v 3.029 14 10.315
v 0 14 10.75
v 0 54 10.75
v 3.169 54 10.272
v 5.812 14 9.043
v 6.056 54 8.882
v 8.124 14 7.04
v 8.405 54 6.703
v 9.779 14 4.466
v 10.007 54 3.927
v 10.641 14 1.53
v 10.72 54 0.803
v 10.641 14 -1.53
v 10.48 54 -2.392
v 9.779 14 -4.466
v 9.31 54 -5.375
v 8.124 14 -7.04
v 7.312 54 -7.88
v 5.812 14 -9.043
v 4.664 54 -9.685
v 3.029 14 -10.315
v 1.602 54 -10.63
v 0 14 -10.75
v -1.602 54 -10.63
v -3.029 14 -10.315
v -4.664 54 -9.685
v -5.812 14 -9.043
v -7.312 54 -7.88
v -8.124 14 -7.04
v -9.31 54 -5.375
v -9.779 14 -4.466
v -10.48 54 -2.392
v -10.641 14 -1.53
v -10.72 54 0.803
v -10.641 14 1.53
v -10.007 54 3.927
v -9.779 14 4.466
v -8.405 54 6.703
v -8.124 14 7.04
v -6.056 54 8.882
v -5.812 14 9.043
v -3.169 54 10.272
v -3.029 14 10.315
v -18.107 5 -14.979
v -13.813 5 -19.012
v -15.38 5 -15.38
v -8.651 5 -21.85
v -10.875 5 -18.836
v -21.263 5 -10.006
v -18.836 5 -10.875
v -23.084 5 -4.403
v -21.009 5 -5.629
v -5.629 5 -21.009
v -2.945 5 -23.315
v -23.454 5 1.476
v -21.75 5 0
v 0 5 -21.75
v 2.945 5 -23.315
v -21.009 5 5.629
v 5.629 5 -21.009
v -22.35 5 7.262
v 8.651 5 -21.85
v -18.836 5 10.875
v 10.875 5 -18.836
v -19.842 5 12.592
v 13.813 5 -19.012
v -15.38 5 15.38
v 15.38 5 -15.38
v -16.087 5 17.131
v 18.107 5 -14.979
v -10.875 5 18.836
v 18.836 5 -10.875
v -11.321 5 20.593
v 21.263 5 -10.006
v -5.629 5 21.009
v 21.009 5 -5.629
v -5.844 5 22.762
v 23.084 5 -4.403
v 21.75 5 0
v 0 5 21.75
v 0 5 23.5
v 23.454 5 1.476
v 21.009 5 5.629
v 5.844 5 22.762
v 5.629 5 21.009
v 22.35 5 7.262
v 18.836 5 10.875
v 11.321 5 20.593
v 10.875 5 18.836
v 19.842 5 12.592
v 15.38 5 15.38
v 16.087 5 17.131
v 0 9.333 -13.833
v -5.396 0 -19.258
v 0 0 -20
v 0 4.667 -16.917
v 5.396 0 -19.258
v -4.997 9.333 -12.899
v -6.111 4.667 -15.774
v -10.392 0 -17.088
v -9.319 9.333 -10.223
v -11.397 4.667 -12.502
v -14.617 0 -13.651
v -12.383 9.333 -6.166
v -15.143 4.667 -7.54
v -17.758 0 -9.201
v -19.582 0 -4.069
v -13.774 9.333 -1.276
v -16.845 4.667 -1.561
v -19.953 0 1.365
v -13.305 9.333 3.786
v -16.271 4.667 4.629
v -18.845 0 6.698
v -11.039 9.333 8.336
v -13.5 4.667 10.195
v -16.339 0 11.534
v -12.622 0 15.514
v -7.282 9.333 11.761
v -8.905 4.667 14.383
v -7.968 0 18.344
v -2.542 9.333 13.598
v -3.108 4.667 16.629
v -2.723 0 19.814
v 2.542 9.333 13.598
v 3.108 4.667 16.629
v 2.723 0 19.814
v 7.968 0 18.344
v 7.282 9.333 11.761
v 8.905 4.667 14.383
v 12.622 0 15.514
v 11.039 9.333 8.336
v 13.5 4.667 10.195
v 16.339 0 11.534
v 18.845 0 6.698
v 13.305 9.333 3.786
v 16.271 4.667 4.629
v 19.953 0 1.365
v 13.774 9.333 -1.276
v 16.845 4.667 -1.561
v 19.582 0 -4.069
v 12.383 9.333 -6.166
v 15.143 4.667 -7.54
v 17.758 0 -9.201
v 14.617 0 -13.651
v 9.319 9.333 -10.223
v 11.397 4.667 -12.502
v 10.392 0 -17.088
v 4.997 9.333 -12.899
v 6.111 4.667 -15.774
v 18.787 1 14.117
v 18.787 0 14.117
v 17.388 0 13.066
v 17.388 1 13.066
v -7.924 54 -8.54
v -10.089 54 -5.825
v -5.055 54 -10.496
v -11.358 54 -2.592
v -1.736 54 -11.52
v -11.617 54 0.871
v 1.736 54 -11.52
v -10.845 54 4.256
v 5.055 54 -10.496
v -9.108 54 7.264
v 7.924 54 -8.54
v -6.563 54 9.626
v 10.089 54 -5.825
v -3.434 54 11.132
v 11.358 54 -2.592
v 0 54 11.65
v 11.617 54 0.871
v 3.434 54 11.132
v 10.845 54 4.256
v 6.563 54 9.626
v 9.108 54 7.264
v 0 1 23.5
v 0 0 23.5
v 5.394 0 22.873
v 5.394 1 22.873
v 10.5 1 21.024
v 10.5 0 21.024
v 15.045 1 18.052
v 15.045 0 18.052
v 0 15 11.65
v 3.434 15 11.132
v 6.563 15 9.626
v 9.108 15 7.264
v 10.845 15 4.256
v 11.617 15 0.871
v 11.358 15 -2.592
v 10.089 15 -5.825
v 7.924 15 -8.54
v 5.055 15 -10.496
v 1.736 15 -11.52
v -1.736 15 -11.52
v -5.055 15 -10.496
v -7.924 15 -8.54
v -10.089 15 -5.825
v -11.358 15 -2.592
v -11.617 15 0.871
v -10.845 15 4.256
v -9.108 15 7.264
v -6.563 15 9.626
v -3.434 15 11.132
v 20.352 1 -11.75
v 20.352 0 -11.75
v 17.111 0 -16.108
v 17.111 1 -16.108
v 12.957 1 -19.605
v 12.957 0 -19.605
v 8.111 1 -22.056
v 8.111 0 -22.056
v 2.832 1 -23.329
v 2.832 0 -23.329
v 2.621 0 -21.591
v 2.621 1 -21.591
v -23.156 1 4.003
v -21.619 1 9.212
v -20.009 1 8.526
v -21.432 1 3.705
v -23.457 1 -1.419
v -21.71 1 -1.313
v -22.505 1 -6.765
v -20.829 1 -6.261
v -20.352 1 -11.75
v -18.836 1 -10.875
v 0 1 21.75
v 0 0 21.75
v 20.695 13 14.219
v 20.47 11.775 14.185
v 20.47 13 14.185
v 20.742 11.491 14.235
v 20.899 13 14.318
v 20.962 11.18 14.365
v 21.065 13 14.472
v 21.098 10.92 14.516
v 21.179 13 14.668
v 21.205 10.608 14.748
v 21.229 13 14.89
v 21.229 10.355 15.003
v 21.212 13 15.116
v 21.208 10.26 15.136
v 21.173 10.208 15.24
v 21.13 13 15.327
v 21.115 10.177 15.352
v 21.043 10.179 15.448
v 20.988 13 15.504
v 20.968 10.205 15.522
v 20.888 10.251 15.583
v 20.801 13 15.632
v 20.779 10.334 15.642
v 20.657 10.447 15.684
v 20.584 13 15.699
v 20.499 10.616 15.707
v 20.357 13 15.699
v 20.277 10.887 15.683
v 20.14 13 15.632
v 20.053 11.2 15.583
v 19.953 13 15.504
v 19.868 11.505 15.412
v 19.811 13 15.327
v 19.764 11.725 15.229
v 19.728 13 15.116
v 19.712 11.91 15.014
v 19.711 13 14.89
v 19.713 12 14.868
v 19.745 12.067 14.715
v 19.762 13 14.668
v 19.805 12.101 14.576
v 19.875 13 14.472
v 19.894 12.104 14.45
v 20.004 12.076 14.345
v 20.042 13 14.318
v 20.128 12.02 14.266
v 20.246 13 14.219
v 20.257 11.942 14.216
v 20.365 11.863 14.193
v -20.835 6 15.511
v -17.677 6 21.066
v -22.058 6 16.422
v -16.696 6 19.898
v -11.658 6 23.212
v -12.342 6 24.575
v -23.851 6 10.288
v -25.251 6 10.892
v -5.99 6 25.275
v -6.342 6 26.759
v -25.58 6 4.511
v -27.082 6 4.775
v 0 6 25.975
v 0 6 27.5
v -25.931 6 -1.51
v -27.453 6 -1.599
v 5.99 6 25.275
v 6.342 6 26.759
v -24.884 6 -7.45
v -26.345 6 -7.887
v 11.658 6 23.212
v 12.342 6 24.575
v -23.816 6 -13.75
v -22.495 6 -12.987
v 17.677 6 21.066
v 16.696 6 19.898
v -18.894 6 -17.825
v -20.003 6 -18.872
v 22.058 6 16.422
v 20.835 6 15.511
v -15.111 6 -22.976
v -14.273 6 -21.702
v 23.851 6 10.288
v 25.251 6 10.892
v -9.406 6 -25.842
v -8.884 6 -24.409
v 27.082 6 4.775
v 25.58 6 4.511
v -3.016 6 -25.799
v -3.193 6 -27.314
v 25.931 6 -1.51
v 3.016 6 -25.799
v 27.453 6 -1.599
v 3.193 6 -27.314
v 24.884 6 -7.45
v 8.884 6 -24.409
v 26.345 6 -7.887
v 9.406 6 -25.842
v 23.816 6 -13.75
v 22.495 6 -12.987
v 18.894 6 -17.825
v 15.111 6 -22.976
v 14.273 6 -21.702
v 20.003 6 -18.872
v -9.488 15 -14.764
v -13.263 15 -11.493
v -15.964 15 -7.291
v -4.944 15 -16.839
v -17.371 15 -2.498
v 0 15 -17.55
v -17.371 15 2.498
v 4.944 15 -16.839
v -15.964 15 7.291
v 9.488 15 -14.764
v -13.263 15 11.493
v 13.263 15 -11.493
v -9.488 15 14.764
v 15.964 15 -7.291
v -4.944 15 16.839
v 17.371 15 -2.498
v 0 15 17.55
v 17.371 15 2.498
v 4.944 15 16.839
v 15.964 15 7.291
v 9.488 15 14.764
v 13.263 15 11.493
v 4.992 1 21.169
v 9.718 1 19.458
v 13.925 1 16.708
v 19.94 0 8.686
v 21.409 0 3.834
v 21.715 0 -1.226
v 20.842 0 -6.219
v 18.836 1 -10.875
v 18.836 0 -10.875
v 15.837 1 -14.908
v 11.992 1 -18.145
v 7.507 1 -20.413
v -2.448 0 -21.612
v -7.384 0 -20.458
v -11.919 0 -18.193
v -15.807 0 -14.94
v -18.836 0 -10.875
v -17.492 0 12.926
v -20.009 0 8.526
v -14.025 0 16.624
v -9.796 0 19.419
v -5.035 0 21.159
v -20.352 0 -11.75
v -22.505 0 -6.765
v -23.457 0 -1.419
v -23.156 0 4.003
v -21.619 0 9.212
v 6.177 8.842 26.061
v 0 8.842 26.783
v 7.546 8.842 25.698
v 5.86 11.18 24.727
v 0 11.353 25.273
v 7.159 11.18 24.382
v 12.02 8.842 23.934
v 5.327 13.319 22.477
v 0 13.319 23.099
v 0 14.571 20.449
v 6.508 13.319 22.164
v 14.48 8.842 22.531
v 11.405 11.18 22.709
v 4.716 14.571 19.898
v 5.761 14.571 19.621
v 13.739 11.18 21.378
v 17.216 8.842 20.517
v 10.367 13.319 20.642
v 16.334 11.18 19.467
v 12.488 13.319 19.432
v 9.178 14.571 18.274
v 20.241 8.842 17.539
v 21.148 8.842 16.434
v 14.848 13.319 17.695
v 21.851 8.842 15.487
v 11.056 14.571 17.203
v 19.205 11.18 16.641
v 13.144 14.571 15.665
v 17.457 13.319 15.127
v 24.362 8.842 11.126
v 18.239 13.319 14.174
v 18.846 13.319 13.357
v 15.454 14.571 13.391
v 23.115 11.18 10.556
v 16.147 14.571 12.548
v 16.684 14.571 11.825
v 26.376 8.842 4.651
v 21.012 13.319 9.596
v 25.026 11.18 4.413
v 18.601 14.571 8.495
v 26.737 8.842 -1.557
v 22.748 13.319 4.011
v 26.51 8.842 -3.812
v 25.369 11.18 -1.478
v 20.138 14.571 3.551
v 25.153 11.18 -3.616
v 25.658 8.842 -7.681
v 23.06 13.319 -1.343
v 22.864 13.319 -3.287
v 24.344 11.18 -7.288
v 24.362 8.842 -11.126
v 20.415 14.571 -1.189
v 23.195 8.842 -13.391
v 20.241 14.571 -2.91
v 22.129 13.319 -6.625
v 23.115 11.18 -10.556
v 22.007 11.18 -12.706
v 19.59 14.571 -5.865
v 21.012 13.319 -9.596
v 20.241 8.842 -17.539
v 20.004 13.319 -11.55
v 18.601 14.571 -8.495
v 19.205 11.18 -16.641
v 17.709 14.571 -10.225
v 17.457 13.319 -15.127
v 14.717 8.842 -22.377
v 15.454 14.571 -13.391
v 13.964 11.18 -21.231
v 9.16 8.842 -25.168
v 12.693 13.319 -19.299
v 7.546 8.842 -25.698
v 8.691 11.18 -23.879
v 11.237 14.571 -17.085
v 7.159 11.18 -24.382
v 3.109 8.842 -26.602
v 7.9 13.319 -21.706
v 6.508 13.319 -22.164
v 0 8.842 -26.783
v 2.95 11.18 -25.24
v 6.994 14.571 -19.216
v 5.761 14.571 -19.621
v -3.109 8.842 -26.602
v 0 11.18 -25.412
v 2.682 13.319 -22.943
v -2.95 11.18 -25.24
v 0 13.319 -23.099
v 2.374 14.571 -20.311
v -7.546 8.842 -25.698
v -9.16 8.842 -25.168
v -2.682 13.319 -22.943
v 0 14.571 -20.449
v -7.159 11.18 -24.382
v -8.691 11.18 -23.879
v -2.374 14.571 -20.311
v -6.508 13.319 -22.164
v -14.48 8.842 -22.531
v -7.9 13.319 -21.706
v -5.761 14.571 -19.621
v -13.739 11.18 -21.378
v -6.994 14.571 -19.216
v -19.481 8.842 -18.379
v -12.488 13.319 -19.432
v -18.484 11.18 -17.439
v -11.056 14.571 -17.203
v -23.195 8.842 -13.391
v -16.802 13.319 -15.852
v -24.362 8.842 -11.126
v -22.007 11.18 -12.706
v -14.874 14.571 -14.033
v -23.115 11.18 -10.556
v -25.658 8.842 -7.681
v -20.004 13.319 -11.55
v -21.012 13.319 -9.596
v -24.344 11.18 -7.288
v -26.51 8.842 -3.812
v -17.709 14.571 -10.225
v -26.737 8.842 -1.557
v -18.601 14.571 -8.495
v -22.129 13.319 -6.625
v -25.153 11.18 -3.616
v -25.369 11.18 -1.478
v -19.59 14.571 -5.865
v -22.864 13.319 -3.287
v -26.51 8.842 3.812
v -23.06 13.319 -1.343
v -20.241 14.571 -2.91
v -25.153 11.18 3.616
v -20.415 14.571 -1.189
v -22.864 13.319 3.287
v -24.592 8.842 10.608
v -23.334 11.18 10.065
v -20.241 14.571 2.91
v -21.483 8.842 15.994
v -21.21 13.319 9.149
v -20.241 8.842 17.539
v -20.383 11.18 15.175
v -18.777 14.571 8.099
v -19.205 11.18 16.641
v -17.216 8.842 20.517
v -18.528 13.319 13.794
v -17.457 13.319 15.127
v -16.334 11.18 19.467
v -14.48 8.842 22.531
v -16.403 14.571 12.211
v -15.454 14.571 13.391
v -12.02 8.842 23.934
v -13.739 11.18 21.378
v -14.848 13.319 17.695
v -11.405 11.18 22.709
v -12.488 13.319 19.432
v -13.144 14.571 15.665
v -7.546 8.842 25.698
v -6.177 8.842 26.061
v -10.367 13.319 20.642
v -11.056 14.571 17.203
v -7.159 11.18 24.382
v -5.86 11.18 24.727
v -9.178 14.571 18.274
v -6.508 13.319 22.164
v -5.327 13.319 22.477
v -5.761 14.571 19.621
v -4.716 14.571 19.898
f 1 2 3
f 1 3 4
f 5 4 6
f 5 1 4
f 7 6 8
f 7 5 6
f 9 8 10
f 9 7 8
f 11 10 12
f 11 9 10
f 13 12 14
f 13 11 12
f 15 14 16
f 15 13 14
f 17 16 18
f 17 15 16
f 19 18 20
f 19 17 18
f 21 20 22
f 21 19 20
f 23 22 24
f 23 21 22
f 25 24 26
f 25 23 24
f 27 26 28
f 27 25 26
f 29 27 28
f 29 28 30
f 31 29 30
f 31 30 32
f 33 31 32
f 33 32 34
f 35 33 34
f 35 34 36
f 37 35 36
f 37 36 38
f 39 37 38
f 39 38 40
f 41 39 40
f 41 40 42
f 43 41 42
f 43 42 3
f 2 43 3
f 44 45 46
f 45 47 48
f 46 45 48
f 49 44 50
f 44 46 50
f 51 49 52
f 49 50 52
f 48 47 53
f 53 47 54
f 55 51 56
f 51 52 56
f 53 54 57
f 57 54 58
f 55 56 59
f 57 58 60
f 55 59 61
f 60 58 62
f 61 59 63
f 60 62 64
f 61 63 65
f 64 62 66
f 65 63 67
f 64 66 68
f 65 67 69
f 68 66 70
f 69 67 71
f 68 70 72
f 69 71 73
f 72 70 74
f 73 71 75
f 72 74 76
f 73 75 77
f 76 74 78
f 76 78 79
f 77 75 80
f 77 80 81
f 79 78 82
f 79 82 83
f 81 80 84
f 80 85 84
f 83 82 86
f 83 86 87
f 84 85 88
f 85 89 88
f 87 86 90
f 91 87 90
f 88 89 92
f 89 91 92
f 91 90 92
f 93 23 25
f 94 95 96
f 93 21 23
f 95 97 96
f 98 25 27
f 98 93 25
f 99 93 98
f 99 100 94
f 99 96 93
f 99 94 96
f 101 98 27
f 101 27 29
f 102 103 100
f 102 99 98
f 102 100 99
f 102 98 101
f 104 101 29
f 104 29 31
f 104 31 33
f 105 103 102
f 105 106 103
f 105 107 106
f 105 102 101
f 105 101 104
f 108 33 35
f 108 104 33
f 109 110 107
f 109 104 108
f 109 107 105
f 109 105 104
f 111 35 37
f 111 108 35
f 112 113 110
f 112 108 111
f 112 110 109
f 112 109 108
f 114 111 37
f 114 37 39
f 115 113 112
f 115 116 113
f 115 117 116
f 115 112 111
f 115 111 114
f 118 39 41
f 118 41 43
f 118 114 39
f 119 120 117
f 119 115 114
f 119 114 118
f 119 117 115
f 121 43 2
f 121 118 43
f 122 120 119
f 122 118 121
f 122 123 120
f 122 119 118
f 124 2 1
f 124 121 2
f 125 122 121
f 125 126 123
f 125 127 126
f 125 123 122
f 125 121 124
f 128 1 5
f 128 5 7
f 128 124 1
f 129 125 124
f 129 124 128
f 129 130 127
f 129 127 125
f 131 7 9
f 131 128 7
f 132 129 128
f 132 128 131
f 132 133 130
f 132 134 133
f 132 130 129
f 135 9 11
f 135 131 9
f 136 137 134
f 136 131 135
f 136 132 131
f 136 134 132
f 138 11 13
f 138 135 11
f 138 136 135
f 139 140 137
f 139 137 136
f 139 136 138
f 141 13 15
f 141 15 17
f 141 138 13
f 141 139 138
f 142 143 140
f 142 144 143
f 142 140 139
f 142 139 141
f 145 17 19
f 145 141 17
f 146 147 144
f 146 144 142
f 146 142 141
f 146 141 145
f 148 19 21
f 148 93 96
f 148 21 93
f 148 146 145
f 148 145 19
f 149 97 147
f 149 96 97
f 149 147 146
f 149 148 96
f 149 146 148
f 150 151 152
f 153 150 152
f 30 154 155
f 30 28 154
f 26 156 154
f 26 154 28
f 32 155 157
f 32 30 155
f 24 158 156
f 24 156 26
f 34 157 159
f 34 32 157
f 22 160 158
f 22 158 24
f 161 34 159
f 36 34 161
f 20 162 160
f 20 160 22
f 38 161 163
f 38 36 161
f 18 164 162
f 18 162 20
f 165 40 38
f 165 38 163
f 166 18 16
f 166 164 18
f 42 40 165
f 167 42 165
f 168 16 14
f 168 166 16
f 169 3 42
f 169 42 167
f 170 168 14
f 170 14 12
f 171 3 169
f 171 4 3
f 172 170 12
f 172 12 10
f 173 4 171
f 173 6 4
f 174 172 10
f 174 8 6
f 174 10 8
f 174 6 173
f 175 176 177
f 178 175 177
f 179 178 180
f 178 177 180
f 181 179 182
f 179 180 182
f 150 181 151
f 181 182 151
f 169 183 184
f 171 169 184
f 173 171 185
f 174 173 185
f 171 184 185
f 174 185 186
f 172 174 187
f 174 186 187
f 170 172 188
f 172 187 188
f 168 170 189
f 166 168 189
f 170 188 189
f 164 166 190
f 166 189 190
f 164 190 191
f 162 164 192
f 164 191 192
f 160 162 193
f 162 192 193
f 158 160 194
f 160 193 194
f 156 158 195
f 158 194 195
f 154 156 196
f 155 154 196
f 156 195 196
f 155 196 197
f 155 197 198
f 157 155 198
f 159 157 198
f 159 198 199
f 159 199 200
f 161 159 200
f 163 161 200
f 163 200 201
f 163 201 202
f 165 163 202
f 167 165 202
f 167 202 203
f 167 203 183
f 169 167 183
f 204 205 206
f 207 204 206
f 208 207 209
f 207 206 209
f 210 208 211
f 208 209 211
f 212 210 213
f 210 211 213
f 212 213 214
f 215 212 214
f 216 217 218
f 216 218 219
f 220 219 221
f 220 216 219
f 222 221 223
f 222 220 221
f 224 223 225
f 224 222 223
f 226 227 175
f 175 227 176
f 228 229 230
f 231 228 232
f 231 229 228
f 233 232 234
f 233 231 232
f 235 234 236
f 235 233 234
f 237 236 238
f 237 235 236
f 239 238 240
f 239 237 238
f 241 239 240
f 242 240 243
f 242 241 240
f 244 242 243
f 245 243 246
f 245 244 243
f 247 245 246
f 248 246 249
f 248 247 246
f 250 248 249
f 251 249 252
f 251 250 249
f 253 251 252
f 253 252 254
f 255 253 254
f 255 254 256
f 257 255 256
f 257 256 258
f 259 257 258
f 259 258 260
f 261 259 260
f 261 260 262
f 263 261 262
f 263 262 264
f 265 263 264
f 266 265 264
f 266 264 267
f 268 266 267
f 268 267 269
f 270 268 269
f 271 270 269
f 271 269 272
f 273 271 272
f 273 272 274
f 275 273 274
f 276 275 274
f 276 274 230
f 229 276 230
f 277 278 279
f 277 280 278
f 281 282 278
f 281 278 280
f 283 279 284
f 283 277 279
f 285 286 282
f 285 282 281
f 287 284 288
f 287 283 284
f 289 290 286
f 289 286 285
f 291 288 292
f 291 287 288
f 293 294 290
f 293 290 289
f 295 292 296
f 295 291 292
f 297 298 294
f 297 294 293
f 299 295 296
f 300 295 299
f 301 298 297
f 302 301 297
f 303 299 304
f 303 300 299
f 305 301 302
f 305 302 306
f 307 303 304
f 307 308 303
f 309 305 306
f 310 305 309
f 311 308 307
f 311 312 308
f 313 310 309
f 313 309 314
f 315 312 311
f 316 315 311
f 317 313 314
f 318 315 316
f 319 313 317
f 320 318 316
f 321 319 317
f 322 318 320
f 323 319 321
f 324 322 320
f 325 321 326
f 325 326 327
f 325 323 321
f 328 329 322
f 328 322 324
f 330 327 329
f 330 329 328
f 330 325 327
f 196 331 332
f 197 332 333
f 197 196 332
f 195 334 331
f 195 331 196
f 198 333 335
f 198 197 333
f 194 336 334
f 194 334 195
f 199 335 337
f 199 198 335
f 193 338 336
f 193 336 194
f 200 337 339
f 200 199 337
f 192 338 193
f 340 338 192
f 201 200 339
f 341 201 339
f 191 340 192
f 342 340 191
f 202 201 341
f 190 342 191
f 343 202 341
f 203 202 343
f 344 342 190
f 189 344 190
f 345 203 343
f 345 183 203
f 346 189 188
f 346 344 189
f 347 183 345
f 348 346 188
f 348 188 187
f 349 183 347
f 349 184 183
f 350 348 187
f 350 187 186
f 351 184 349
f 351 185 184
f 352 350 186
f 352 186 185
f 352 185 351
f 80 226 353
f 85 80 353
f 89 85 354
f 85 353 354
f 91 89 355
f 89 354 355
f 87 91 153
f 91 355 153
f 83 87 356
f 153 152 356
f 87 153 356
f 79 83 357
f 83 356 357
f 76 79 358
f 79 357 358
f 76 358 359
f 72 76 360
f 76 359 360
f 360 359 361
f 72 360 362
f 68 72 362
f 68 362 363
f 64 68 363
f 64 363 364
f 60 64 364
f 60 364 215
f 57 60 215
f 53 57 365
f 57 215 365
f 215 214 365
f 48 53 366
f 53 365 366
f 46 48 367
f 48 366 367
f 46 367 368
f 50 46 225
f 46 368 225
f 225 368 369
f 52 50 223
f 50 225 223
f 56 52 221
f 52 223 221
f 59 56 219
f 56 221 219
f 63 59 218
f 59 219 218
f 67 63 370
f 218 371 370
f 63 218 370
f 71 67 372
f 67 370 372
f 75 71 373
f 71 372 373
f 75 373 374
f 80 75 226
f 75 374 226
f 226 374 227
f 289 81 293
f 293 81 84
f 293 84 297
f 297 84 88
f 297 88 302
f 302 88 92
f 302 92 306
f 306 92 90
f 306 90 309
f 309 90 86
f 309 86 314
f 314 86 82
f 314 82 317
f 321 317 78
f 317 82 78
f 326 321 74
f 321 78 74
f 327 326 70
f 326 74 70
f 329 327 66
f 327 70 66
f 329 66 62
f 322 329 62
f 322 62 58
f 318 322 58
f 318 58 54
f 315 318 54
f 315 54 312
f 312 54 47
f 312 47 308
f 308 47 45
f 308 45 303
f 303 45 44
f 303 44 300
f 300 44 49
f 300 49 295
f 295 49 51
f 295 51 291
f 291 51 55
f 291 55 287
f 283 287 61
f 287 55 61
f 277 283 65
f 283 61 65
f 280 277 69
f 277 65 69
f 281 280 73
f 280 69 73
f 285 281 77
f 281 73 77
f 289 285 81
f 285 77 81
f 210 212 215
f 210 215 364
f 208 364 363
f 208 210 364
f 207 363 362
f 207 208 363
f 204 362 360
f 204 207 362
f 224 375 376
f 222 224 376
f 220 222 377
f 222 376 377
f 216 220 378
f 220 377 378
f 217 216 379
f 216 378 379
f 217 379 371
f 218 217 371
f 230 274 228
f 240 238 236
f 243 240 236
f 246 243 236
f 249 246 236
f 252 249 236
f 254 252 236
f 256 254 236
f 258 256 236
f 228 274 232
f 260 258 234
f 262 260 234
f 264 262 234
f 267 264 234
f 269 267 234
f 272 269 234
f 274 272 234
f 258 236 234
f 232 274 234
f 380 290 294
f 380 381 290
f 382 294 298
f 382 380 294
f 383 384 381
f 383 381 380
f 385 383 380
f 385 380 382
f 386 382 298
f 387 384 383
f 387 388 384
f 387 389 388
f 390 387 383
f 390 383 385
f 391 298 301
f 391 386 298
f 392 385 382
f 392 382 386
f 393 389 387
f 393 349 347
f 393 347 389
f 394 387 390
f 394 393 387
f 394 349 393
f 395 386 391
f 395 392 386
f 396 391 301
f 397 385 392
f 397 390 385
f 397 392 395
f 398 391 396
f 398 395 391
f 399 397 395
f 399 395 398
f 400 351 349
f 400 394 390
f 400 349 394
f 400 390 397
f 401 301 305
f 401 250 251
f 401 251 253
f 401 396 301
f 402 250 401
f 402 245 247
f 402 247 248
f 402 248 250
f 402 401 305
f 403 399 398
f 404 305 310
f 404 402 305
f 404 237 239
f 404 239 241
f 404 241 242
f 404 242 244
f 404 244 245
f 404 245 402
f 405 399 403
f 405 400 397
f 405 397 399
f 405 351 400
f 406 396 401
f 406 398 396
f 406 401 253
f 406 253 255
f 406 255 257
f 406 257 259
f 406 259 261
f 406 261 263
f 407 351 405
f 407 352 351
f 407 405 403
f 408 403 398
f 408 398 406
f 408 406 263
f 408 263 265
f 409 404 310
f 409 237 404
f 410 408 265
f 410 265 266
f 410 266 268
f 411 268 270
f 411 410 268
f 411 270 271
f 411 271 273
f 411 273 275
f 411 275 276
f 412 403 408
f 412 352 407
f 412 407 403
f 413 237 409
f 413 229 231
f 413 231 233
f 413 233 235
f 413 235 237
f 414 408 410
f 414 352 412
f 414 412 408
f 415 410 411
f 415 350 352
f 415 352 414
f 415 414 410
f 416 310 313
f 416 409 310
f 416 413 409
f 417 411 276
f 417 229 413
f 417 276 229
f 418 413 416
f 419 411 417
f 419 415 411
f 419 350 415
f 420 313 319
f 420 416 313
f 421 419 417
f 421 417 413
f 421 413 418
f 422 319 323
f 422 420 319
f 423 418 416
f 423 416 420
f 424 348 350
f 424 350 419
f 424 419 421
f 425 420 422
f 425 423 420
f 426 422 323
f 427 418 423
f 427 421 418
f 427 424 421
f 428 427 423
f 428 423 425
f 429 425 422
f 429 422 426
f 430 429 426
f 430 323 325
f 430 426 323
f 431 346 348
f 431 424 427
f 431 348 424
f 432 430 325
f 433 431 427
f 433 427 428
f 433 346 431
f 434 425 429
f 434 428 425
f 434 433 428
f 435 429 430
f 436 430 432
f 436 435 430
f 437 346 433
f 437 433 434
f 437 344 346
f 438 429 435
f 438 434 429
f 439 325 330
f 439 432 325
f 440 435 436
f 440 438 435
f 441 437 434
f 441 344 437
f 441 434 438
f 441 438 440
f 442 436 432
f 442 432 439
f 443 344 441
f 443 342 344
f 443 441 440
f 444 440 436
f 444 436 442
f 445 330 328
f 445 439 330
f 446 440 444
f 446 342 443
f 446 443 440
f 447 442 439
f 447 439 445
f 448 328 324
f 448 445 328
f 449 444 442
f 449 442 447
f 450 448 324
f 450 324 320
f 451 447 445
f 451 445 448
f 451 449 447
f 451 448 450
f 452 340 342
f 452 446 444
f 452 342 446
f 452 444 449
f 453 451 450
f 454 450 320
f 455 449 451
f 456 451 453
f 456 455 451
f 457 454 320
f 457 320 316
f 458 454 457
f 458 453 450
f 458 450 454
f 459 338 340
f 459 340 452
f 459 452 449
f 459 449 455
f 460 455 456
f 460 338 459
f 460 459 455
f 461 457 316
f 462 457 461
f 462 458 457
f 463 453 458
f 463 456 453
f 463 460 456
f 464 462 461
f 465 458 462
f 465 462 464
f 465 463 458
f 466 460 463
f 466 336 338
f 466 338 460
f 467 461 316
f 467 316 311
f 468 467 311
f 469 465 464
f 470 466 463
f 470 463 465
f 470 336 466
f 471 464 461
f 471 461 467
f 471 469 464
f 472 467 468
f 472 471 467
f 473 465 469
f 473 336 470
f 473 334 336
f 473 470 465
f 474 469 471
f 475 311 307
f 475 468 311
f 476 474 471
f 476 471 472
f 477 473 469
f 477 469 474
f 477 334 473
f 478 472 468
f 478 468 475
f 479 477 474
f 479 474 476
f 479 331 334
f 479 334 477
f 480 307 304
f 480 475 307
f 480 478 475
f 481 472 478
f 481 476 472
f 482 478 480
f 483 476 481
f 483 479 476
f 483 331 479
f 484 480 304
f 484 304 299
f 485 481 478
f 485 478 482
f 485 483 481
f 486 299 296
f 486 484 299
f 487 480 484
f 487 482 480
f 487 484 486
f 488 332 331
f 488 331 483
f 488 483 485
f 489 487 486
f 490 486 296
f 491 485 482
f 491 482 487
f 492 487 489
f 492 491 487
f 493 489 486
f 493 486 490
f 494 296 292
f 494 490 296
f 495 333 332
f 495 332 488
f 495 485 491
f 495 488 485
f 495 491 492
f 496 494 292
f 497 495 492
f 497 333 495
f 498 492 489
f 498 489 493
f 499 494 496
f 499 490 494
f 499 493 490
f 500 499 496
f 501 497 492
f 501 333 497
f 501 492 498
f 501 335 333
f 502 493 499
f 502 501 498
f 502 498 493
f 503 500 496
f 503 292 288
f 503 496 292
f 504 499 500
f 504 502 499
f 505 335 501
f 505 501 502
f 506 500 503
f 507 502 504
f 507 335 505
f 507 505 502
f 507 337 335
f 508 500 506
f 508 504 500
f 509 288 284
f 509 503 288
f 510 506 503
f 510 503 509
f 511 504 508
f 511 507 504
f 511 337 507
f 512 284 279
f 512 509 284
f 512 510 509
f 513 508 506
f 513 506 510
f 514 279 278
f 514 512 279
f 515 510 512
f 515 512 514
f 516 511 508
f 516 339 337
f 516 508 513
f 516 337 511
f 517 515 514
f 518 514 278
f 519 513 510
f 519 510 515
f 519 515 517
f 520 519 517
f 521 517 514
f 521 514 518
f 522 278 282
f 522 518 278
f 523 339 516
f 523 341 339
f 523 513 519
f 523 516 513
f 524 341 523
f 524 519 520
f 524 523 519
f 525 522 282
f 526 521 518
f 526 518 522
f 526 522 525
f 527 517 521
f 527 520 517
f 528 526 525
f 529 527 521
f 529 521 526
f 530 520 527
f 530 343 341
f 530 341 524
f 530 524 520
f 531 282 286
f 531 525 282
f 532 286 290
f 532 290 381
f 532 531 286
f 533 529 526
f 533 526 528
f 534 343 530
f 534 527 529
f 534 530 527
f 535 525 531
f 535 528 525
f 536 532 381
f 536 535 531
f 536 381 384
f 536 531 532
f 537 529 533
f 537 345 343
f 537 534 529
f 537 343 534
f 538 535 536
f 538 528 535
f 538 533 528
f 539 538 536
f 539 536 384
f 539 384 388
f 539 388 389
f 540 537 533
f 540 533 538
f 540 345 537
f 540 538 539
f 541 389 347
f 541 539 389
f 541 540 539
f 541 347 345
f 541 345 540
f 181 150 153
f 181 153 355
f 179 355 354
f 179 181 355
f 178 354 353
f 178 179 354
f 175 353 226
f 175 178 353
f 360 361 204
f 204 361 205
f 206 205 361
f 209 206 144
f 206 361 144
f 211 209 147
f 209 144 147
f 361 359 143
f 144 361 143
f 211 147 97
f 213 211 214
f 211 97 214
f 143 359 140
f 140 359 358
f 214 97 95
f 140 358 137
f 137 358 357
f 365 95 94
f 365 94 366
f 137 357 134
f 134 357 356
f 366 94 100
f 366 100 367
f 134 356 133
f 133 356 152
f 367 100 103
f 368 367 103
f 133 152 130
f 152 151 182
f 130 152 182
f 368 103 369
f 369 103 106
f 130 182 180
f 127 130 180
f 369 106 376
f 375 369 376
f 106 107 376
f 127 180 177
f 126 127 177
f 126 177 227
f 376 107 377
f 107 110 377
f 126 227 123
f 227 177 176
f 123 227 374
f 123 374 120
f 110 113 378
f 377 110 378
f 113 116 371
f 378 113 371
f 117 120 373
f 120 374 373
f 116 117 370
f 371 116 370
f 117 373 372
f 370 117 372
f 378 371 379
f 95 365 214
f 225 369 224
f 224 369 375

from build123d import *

# Parameters (mm, degrees)
SKETCH1_R           = 21.75
SKETCH1_R_2         = 20
BOSS_EXTRUDE1_DEPTH = 5
SKETCH2_R           = 23.5
SKETCH2_R_2         = 20
BOSS_EXTRUDE2_DEPTH = 1
SKETCH3_R           = 27.5
SKETCH3_R_2         = 20
BOSS_EXTRUDE3_DEPTH = 8
SKETCH4_R           = 11.65
SKETCH4_R_2         = 10.75
BOSS_EXTRUDE4_DEPTH = 40
SKETCH5_R           = 27.5
SKETCH5_R_2         = 11.65
BOSS_EXTRUDE5_DEPTH = 1
BOSS_EXTRUDE6_DEPTH = 1
CIRPATTERN1_COUNT   = 3
FILLET1_R           = 10
SKETCH8_R           = 0.761145908
BOSS_EXTRUDE7_DEPTH = 7
CHAMFER2_SIZE2      = 1
CHAMFER2_SIZE       = 2.475086853


# Some blends are built 0.0001 mm under size
with BuildPart() as part:
    # Sketch1 → Boss-Extrude1 (new body)
    with BuildSketch(Plane(origin=(0, 0, 0), x_dir=(1, 0, 0), z_dir=(0, 1, 0))):
        with Locations(Location((0, 0, 0), (0, 0, 270))):
            Circle(SKETCH1_R)
        with Locations(Location((0, 0, 0), (0, 0, 270))):
            Circle(SKETCH1_R_2, mode=Mode.SUBTRACT)
    boss_extrude1 = extrude(amount=BOSS_EXTRUDE1_DEPTH)

    # Sketch2 → Boss-Extrude2 (add)
    with BuildSketch(Plane(origin=(0, 5, 0), x_dir=(1, 0, 0), z_dir=(0, 1, 0))):
        with Locations(Location((0, 0, 0), (0, 0, 270))):
            Circle(SKETCH2_R)
        with Locations(Location((0, 0, 0), (0, 0, 270))):
            Circle(SKETCH2_R_2, mode=Mode.SUBTRACT)
    extrude(amount=BOSS_EXTRUDE2_DEPTH)

    # Sketch3 → Boss-Extrude3 (add)
    with BuildSketch(Plane(origin=(0, 6, 0), x_dir=(1, 0, 0), z_dir=(0, 1, 0))):
        with Locations(Location((0, 0, 0), (0, 0, 270))):
            Circle(SKETCH3_R)
        with Locations(Location((0, 0, 0), (0, 0, 270))):
            Circle(SKETCH3_R_2, mode=Mode.SUBTRACT)
    extrude(amount=BOSS_EXTRUDE3_DEPTH)



with BuildPart() as body_2:
    # Sketch4 → Boss-Extrude4 (new body)
    with BuildSketch(Plane(origin=(0, 14, 0), x_dir=(1, 0, 0), z_dir=(0, 1, 0))):
        with Locations(Location((0, 0, 0), (0, 0, 270))):
            Circle(SKETCH4_R)
        with Locations(Location((0, 0, 0), (0, 0, 270))):
            Circle(SKETCH4_R_2, mode=Mode.SUBTRACT)
    extrude(amount=BOSS_EXTRUDE4_DEPTH)


with BuildPart() as part_1:
    add(part.part)

    add(body_2.part)  # Boss-Extrude5 merges body 2
    # Sketch5 → Boss-Extrude5 (add)
    with BuildSketch(Plane(origin=(0, 14, 0), x_dir=(1, 0, 0), z_dir=(0, 1, 0))):
        with Locations(Location((0, 0, 0), (0, 0, 270))):
            Circle(SKETCH5_R)
        with Locations(Location((0, 0, 0), (0, 0, 270))):
            Circle(SKETCH5_R_2, mode=Mode.SUBTRACT)
    extrude(amount=BOSS_EXTRUDE5_DEPTH)

    # Sketch6 → Revolve1 (revolve)
    with BuildSketch(Plane.XY, mode=Mode.PRIVATE) as revolve1_sk:
        Polygon((10.75, 14), (20, 0), (20, 14), align=None)
    revolve(revolve1_sk.sketch.rotate(Axis((0, 0, 0), (0, 1, 0)), 90), axis=Axis((0, 0, 0), (0, 1, 0)))

    # Sketch7 → Boss-Extrude6 (add)
    with BuildSketch(Plane.XZ):
        with BuildLine():
            Line((0, 21.75), (0, 23.5))
            ThreePointArc((0, 23.5), (10.5, 21.023796042), (18.787221995, 14.117021277))
            Line((18.787221995, 14.117021277), (17.388173548, 13.065753735))
            ThreePointArc((17.388173548, 13.065753735), (9.718085106, 19.458194209), (0, 21.75))
        make_face()
    boss_extrude6 = extrude(amount=-BOSS_EXTRUDE6_DEPTH)

    # CirPattern1: Boss-Extrude1, Boss-Extrude6 ×3 about axis
    cirpattern1_axis = Axis((0, 0, 0), (0, 1, 0))
    add([boss_extrude1.rotate(cirpattern1_axis, i * 360 / CIRPATTERN1_COUNT) for i in range(1, CIRPATTERN1_COUNT)])
    add([boss_extrude6.rotate(cirpattern1_axis, i * 360 / CIRPATTERN1_COUNT) for i in range(1, CIRPATTERN1_COUNT)])

    # Fillet1
    # the kernel refuses this fillet: 10 mm, written as the material it takes off along each edge
    with BuildSketch(Plane(origin=(0, 15, 0), x_dir=(0, 0, 1), z_dir=(-1, 0, 0))) as fillet1_piece_1:
        with BuildLine():
            CenterArc((17.550125629, -10), FILLET1_R, 5.739170477, 84.260829523)
            Line((17.550125629, 0), (17.550125629, 0.2))
            Line((17.550125629, 0.2), (27.5, 0.2))
            Line((27.5, 0.2), (27.7, 0))
            ThreePointArc((27.7, 0), (27.7, -4.5), (27.698997487, -8.98))
            Line((27.698997487, -8.98), (27.5, -9))
        make_face()
    revolve(axis=Axis((0, 15, 0), (0, 1, 0)), mode=Mode.SUBTRACT)

    # Sketch8 → Boss-Extrude7 (add)
    with BuildSketch(Plane.XZ.offset(-6)):
        with Locations(Location((20.470368468, 14.946483104, 0), (0, 0, 270))):
            Circle(SKETCH8_R)
    extrude(amount=-BOSS_EXTRUDE7_DEPTH)

    # Chamfer2
    chamfer2_edges = [part_1.edges().sort_by_distance(p)[0] for p in [
        (0, 6, -23.5),
    ]]
    chamfer2_side = [part_1.faces().sort_by_distance(p)[0] for p in [
        (0, 6, -23.52),
    ]]
    chamfer(chamfer2_edges, length=CHAMFER2_SIZE - 0.0001, length2=CHAMFER2_SIZE2 - 0.0001, reference=chamfer2_side[0])  # a hair under: the kernel refuses the full size


solid = part_1.part
